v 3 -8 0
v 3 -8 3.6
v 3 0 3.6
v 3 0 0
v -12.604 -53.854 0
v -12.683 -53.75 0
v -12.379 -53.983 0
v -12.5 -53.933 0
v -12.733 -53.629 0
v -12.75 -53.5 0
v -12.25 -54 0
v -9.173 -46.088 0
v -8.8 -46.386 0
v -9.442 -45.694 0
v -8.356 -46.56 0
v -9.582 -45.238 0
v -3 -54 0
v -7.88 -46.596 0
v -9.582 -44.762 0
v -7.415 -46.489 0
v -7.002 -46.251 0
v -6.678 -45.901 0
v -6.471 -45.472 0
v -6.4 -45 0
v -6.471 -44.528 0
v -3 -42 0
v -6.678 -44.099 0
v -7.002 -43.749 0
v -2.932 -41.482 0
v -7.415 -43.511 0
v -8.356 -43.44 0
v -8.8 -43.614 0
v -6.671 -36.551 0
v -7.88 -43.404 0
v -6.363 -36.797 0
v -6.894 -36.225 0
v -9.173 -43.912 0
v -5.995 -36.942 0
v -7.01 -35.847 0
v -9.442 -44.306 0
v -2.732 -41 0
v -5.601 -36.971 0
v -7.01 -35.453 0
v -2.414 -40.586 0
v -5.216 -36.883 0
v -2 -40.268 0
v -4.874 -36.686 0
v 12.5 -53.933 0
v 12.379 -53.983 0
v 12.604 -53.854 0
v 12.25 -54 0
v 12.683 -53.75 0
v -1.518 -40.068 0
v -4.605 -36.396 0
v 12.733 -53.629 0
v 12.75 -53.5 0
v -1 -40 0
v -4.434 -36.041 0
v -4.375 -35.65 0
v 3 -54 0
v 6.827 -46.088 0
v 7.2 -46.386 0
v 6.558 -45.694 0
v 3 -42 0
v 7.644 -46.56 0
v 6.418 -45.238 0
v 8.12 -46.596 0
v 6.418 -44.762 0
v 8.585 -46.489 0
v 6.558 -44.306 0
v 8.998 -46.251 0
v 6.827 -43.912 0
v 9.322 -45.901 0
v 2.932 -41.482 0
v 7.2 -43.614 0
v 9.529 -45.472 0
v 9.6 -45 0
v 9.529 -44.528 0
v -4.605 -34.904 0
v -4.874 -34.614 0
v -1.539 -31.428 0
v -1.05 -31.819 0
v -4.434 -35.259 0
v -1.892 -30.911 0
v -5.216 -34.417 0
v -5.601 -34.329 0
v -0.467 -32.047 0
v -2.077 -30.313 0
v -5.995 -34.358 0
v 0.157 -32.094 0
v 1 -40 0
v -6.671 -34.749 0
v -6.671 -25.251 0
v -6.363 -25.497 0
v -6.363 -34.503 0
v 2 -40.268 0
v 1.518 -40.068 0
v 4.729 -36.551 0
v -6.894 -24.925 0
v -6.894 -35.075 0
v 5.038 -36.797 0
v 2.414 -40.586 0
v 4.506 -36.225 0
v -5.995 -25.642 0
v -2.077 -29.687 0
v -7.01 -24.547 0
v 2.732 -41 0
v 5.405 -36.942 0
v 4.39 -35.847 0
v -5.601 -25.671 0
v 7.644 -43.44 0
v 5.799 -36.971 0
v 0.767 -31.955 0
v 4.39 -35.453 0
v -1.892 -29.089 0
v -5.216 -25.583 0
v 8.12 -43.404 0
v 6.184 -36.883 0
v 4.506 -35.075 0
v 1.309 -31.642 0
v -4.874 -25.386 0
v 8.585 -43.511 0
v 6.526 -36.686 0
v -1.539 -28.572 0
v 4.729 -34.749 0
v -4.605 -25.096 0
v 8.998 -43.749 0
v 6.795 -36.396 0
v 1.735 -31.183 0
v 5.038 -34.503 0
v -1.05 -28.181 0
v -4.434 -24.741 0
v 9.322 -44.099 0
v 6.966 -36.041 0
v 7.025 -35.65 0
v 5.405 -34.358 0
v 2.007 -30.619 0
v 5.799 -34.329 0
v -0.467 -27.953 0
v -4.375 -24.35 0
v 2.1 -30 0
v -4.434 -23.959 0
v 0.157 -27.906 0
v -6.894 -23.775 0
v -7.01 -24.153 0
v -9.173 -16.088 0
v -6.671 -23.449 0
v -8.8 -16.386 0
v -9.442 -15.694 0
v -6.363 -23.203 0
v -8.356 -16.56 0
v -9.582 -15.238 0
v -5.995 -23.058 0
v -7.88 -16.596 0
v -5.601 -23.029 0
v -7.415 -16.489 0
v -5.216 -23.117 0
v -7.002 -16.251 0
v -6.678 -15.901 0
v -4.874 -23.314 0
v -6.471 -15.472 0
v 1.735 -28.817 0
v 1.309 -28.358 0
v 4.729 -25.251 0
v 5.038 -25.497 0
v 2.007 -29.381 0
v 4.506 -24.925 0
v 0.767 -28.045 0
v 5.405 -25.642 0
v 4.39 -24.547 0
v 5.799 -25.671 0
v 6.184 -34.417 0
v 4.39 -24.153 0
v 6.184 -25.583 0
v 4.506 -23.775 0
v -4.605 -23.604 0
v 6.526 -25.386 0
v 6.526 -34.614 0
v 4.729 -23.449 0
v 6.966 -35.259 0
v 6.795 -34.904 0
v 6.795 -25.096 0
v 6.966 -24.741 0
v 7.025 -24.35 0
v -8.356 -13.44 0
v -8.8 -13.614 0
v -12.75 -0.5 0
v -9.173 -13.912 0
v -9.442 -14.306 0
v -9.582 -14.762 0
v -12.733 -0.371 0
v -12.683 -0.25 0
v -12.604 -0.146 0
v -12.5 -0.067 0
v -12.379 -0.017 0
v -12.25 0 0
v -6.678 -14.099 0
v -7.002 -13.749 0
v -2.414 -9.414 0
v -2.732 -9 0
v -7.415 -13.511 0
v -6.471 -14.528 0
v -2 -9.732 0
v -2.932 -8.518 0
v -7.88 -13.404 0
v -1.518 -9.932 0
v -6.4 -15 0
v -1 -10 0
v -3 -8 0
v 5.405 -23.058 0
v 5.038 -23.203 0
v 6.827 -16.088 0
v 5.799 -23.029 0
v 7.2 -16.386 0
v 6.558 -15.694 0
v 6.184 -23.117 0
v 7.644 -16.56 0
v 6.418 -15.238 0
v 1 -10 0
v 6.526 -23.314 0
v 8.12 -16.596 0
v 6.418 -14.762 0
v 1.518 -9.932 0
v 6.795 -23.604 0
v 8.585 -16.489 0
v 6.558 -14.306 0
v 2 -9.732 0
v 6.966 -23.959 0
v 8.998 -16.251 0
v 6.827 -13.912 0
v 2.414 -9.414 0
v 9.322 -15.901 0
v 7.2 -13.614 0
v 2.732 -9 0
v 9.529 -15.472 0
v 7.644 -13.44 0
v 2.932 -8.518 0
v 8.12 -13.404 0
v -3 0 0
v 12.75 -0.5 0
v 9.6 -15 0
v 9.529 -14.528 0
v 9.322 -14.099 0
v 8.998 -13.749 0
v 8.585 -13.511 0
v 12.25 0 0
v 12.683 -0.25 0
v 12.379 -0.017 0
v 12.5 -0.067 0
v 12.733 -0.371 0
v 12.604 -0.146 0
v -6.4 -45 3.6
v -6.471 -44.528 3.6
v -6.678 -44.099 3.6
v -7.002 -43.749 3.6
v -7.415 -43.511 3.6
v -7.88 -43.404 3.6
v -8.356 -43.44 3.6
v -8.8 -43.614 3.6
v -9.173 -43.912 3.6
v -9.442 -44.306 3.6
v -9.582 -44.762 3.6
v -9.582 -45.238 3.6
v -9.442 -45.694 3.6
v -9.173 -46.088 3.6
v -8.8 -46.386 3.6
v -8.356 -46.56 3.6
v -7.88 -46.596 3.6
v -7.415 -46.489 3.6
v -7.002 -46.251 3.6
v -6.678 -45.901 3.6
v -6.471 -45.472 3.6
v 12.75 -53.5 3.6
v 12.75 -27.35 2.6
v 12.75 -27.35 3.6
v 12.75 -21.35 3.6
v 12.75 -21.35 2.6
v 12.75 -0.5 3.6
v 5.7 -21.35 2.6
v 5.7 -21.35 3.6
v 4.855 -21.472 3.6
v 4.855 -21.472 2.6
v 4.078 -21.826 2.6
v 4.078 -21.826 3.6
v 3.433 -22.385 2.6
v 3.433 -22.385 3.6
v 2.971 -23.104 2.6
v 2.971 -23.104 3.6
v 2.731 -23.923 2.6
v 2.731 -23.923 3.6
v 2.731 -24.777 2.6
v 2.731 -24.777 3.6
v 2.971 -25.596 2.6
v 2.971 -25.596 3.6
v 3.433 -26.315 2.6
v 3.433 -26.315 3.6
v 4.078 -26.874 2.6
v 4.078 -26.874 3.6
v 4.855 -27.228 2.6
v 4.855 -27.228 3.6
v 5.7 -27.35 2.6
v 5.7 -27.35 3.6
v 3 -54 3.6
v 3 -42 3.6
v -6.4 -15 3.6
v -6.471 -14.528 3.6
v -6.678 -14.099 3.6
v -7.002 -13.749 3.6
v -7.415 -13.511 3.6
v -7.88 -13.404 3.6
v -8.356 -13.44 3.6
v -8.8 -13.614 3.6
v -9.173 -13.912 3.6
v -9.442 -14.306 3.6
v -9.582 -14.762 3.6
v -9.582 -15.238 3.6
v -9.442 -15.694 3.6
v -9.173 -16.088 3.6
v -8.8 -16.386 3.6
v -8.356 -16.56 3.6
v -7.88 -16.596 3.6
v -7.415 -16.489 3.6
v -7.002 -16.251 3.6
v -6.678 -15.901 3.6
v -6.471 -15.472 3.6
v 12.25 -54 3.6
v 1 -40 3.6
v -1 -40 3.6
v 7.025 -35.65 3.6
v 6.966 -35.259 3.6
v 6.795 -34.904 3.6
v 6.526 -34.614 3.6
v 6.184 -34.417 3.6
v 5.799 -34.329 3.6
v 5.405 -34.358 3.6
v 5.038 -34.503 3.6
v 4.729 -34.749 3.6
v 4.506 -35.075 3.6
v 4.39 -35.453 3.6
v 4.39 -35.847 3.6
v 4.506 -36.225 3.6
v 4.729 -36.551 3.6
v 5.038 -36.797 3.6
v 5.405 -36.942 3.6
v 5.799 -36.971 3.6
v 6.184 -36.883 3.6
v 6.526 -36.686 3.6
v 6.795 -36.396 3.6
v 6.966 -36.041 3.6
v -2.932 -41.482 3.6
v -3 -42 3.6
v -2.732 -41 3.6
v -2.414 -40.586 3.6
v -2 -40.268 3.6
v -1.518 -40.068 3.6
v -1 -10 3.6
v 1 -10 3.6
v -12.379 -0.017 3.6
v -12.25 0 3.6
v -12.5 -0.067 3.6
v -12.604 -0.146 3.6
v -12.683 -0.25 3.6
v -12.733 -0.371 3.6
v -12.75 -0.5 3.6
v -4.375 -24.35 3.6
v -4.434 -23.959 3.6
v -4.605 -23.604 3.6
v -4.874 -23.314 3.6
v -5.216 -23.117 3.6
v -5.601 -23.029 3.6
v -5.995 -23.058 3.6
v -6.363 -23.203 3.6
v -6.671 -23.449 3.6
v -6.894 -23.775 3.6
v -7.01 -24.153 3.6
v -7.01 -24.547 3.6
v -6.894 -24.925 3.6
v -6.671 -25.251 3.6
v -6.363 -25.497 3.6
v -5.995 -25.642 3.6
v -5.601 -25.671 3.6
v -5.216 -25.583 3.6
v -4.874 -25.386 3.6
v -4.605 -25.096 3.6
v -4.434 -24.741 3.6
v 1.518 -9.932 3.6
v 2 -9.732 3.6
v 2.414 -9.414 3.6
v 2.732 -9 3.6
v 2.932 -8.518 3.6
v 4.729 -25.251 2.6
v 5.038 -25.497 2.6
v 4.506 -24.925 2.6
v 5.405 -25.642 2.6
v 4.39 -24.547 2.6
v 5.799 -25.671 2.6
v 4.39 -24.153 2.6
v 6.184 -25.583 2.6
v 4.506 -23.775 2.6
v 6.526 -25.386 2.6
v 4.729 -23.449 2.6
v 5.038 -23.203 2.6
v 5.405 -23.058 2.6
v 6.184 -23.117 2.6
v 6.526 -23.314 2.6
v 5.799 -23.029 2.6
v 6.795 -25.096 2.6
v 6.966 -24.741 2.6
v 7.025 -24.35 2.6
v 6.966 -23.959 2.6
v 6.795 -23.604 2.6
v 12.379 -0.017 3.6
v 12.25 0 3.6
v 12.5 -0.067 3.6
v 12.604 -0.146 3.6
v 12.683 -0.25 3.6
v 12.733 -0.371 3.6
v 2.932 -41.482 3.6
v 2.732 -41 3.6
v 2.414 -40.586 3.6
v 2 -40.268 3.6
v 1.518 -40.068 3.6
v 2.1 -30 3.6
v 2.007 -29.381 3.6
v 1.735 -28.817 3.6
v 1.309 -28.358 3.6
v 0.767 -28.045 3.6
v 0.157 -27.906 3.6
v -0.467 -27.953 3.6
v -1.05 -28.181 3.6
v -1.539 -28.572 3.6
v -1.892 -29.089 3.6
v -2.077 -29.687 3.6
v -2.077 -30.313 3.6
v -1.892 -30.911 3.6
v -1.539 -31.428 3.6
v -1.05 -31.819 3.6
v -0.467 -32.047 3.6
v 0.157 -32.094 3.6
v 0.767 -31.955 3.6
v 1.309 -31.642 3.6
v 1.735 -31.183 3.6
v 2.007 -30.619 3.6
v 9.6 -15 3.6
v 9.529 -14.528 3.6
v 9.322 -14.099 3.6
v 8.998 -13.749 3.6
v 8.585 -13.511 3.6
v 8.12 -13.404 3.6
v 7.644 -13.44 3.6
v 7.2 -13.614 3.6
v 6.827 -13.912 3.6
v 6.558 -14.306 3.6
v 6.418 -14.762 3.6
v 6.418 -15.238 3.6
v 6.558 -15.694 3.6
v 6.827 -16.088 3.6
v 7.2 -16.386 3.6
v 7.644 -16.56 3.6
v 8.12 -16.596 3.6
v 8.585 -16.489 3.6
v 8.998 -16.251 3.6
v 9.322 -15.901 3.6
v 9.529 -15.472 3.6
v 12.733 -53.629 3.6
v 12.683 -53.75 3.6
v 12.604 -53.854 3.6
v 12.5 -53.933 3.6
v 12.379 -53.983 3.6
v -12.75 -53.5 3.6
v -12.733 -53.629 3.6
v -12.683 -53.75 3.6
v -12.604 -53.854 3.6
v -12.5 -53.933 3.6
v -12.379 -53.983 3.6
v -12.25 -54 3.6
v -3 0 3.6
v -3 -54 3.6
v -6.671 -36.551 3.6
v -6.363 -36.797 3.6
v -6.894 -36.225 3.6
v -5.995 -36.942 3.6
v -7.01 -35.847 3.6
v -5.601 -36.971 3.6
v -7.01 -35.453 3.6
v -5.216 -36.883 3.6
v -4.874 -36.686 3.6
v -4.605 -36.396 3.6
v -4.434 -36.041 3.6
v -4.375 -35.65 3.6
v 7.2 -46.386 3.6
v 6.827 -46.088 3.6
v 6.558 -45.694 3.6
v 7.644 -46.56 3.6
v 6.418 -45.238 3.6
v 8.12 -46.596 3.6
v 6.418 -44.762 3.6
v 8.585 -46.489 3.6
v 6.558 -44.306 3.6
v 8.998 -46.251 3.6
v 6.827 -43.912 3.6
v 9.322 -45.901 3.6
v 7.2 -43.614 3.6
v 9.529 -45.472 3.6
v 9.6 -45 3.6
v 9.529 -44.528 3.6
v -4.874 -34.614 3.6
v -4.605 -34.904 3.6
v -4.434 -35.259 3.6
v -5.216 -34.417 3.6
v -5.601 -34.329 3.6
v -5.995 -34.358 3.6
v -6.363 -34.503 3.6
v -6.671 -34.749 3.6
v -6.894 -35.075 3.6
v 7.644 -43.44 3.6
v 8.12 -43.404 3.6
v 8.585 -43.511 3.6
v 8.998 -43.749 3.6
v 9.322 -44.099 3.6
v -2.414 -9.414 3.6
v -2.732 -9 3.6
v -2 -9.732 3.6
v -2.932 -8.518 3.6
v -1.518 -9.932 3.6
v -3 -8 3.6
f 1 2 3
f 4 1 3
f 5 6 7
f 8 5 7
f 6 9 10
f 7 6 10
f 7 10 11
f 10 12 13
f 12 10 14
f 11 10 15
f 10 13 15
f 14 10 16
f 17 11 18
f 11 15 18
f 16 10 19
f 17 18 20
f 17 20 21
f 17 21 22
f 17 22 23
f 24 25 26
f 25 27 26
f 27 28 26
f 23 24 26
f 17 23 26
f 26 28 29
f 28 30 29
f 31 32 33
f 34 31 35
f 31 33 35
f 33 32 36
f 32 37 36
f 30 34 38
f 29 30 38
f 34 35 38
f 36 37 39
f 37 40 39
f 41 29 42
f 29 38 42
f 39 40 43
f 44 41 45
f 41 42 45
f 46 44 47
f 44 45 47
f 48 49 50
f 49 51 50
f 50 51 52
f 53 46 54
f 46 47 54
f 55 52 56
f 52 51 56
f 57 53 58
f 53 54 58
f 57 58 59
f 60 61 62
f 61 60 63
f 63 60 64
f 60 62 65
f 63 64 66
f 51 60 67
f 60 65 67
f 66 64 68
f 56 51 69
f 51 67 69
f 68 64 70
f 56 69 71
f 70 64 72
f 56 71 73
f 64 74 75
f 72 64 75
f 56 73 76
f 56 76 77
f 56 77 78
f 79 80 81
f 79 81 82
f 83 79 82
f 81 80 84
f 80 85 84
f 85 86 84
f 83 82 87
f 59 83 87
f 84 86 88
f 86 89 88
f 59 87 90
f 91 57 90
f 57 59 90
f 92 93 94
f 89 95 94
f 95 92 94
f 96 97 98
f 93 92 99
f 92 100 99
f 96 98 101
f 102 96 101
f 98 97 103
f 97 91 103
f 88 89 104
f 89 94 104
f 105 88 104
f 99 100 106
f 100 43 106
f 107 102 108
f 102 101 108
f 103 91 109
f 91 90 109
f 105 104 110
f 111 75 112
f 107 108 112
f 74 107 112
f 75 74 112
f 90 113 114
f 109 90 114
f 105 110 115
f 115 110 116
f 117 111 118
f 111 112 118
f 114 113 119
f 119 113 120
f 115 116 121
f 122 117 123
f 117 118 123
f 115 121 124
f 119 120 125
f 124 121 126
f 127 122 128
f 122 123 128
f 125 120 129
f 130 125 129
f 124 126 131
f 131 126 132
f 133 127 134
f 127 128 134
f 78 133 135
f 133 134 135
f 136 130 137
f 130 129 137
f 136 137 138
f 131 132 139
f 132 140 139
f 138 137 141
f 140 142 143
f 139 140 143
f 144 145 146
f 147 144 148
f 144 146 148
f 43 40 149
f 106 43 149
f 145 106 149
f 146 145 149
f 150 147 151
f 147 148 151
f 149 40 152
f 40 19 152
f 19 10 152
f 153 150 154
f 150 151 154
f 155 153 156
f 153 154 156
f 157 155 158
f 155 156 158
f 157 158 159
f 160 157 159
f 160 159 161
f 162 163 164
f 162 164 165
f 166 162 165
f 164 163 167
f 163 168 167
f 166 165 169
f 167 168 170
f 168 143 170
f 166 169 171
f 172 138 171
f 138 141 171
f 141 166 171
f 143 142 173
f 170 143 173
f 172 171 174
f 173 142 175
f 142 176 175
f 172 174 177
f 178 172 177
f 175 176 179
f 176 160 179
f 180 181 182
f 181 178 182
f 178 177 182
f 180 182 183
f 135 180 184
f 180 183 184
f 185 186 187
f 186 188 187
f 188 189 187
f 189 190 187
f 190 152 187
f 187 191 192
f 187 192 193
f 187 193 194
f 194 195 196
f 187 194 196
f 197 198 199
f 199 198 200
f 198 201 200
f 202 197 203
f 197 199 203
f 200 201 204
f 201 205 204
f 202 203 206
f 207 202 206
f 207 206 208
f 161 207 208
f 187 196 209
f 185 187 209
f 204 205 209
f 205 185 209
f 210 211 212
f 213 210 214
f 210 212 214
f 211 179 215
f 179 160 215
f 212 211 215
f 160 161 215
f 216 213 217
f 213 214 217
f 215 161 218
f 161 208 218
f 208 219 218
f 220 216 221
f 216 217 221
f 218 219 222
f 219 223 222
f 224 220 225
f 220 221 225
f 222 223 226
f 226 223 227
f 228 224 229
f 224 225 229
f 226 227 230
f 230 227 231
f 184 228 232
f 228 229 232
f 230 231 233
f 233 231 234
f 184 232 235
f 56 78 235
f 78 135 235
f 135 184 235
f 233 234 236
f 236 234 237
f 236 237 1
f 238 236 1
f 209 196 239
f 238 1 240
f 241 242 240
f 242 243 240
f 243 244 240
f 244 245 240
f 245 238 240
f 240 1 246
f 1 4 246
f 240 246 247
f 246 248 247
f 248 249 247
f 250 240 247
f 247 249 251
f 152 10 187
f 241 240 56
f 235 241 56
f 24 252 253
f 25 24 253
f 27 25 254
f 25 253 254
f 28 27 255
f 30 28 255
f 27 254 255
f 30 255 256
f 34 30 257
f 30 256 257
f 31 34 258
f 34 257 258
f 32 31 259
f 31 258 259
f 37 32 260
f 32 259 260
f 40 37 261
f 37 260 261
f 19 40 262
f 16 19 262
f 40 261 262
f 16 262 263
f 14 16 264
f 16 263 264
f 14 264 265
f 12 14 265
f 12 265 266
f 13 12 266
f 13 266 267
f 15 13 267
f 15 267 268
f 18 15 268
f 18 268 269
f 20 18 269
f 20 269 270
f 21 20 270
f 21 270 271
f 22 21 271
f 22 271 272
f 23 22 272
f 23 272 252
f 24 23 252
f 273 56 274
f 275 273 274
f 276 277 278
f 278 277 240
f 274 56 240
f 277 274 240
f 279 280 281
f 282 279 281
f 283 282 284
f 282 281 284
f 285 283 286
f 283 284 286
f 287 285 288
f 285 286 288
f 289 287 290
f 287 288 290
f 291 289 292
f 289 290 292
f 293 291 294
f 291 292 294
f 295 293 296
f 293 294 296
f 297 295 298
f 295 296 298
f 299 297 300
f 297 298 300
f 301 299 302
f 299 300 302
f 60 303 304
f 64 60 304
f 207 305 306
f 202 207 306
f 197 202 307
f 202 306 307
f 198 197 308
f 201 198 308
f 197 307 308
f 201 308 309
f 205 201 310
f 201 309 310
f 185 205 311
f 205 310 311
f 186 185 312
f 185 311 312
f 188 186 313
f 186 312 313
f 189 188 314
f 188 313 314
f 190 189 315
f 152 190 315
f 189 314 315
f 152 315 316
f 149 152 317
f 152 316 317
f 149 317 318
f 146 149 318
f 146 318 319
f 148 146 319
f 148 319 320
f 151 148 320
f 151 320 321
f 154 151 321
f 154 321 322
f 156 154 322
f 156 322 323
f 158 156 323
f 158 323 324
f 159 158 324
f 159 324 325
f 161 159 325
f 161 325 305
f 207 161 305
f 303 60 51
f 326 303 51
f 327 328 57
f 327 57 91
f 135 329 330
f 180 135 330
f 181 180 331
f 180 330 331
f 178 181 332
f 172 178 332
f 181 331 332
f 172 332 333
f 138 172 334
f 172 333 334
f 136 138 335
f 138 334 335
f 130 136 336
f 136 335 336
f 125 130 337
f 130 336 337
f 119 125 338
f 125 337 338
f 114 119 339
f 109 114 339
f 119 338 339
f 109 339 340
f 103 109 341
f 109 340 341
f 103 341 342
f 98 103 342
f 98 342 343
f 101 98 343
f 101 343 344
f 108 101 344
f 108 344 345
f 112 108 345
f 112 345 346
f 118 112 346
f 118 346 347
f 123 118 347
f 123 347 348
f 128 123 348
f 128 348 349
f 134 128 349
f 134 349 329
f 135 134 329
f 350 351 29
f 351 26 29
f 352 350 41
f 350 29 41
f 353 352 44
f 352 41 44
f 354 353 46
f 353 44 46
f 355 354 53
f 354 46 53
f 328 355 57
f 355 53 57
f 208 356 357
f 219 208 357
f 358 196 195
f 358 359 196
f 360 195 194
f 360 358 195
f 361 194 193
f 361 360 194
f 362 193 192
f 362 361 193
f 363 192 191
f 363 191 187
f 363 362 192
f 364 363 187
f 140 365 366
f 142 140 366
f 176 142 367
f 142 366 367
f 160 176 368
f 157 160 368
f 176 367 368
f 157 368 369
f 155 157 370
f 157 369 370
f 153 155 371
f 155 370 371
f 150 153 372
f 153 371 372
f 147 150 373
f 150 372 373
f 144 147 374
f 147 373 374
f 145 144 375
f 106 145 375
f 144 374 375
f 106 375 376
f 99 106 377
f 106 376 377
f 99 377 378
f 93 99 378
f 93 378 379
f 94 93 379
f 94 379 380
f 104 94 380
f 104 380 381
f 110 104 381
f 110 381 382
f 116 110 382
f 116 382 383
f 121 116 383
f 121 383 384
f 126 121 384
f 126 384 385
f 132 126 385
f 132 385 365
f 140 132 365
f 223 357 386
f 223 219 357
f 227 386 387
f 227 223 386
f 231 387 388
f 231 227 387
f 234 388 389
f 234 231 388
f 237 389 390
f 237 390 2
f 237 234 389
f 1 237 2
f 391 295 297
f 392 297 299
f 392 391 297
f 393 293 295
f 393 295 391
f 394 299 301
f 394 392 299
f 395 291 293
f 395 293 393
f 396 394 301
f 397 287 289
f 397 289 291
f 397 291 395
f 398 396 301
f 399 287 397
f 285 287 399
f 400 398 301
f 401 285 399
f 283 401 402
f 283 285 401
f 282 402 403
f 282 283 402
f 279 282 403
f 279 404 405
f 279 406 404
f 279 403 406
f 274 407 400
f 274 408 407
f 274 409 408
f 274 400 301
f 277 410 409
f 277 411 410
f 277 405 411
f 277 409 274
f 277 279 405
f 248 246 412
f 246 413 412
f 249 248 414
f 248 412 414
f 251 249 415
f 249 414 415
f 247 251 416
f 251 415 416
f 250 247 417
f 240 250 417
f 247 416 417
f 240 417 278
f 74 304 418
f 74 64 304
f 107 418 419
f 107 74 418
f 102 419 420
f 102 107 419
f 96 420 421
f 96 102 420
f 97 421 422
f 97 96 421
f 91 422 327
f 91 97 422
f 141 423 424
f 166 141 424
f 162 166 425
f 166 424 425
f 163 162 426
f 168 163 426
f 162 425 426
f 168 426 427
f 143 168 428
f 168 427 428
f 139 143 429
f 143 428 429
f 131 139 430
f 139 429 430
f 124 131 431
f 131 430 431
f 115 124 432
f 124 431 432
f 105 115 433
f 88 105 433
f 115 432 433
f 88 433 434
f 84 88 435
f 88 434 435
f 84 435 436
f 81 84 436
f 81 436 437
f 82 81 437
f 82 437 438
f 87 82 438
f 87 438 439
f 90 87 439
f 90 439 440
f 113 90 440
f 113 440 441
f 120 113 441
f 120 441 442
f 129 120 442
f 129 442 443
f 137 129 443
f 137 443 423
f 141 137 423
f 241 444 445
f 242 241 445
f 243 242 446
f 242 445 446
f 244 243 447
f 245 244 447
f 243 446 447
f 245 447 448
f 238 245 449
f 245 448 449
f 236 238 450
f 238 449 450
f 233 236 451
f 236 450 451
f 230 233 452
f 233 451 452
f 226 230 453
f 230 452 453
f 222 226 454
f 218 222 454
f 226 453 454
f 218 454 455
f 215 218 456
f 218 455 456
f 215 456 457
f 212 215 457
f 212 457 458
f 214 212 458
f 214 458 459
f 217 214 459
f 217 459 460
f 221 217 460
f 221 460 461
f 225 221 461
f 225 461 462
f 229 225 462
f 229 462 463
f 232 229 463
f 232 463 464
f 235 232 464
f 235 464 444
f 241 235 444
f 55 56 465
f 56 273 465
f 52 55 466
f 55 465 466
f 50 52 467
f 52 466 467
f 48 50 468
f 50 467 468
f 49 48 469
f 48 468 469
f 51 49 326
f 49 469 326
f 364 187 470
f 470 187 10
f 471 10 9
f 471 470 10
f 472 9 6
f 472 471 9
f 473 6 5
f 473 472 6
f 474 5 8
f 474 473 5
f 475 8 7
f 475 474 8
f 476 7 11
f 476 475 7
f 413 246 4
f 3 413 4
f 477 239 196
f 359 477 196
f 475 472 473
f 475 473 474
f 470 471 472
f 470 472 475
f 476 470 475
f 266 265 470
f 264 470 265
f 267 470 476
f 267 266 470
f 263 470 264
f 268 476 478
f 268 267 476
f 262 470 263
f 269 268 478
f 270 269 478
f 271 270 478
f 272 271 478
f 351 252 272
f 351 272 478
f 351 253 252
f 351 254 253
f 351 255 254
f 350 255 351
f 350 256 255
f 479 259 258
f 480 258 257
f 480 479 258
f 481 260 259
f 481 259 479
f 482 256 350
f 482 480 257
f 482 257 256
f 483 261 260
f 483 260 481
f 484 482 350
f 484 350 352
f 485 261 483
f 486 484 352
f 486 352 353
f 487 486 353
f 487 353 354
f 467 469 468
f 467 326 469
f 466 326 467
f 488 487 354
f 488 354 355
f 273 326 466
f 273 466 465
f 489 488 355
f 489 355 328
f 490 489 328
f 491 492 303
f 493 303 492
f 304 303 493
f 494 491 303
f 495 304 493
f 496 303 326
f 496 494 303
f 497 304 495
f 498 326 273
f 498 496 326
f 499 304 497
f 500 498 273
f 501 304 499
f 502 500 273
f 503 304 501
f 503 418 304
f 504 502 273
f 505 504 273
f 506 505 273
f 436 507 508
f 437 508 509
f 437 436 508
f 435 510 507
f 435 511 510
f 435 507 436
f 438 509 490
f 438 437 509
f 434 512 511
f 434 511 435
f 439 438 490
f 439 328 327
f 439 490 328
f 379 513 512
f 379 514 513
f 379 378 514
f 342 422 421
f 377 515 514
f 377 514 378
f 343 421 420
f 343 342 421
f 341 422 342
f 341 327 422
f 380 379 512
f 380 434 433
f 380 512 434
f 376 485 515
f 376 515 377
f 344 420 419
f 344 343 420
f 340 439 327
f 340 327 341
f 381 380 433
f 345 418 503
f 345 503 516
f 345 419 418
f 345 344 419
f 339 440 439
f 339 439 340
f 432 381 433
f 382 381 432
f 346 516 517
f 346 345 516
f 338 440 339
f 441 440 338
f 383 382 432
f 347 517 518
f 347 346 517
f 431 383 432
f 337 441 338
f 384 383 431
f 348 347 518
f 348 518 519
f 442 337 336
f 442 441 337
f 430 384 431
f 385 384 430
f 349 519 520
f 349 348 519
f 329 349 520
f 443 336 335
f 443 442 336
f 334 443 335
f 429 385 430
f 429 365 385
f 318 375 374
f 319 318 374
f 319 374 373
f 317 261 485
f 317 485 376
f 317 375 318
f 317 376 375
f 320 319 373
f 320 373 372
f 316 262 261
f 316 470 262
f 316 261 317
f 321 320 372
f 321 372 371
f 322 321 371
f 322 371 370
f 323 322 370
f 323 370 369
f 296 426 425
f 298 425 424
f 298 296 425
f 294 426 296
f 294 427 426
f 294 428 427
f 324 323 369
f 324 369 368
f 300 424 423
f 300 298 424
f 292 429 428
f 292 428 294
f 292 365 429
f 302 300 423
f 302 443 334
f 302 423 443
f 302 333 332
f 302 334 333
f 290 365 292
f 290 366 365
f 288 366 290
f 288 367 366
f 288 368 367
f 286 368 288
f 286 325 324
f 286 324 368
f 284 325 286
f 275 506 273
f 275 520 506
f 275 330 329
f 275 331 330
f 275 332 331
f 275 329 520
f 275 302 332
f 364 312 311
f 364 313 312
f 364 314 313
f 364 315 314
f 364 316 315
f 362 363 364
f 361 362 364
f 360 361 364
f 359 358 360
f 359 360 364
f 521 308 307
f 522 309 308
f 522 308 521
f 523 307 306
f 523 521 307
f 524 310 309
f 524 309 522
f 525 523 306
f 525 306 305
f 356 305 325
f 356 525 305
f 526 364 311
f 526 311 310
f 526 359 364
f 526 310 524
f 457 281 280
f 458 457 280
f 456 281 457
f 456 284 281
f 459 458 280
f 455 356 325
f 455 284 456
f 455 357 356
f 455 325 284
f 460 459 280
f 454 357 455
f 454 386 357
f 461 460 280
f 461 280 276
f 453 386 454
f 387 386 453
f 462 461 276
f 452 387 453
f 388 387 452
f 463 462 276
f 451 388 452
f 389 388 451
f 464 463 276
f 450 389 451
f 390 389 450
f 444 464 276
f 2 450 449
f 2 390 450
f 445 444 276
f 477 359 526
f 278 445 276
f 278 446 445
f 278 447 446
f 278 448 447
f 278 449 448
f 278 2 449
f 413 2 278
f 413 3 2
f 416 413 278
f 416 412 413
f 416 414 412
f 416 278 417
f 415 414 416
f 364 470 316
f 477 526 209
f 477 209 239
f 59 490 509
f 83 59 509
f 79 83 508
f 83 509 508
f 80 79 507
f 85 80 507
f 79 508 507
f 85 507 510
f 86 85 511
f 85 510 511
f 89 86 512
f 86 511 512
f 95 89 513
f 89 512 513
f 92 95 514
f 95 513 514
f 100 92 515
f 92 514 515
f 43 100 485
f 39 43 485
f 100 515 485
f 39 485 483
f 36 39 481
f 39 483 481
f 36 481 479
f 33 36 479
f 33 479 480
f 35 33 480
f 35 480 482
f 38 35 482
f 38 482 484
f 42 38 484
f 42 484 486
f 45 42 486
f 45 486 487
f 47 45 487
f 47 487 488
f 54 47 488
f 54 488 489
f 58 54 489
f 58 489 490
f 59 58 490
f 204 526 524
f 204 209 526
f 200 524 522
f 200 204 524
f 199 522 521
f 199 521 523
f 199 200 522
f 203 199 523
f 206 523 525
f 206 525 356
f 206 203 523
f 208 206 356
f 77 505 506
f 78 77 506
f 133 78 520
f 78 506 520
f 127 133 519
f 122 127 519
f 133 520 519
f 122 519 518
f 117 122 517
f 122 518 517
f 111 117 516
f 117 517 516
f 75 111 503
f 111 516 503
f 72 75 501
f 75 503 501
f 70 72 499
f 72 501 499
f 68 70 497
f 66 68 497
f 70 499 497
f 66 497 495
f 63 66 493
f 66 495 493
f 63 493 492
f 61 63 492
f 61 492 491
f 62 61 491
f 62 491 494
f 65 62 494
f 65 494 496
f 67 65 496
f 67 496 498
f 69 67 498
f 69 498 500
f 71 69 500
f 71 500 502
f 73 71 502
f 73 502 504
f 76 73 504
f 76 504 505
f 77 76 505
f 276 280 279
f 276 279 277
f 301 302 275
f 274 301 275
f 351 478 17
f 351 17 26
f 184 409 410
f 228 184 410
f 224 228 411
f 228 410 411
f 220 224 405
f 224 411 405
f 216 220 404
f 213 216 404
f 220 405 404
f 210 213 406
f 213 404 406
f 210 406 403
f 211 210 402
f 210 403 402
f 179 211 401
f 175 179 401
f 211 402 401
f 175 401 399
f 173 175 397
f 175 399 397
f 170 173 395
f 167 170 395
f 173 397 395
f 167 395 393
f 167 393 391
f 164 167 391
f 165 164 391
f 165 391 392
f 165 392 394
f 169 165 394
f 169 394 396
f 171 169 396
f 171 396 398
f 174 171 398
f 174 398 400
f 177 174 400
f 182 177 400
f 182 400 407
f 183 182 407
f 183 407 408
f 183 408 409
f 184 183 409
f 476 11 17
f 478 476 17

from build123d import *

# Parameters (mm, degrees)
PAD008_DEPTH    = 3.6
SKETCH034_W     = 6
SKETCH034_H     = 14
SKETCH034_H_2   = 10
POCKET014_DEPTH = 5
FILLET007_R     = 2
SKETCH035_R     = 2.1
POCKET019_DEPTH = 5
SKETCH032_R     = 1.325
POCKET020_DEPTH = 5
SKETCH033_R     = 1.6
HOLE004_DEPTH   = 25
FILLET010_R     = 0.5
POCKET043_DEPTH = 1


with BuildPart() as part:
    # Sketch031 → Pad008 (new body)
    with BuildSketch(Plane.XY):
        Polygon((-12.75, 0), (-12.75, -5), (-12.75, -54), (12.75, -54), (12.75, -5), (12.75, 0), align=None)
    extrude(amount=PAD008_DEPTH)

    # Sketch034 (on Face4 of Pad008) → Pocket014 (cut)
    with BuildSketch(Plane.XY.offset(3.6)):
        with Locations((0, -47)):
            Rectangle(SKETCH034_W, SKETCH034_H)
        with Locations((0, -5)):
            Rectangle(SKETCH034_W, SKETCH034_H_2)
    extrude(amount=-POCKET014_DEPTH, mode=Mode.SUBTRACT)

    # Fillet007
    fillet007_edges = [part.edges().sort_by_distance(p)[0] for p in [
        (-3, -10, 1.8),
        (3, -10, 1.8),
        (3, -40, 1.8),
        (-3, -40, 1.8),
    ]]
    fillet(fillet007_edges, radius=FILLET007_R)

    # Sketch035 (on Face4 of Pad008) → Pocket019 (cut)
    with BuildSketch(Plane.XY.offset(3.6)):
        with Locations((0, -30)):
            Circle(SKETCH035_R)
    extrude(amount=-POCKET019_DEPTH, mode=Mode.SUBTRACT)

    # Sketch032 (on Face4 of Pad008) → Pocket020 (cut)
    with BuildSketch(Plane.XY.offset(3.6)):
        with Locations((-5.7, -24.35)):
            Circle(SKETCH032_R)
        with Locations((5.7, -24.35)):
            Circle(SKETCH032_R)
        with Locations((5.7, -35.65)):
            Circle(SKETCH032_R)
        with Locations((-5.7, -35.65)):
            Circle(SKETCH032_R)
    extrude(amount=-POCKET020_DEPTH, mode=Mode.SUBTRACT)

    # Sketch033 (on Face4 of Pad008) → Hole004 (cut)
    with BuildSketch(Plane.XY.offset(3.6)):
        with Locations((-8, -15)):
            Circle(SKETCH033_R)
        with Locations((8, -15)):
            Circle(SKETCH033_R)
        with Locations((-8, -45)):
            Circle(SKETCH033_R)
        with Locations((8, -45)):
            Circle(SKETCH033_R)
    extrude(amount=-HOLE004_DEPTH, mode=Mode.SUBTRACT)

    # Fillet010
    fillet010_edges = [part.edges().sort_by_distance(p)[0] for p in [
        (-12.75, 0, 1.8),
        (-12.75, -54, 1.8),
        (12.75, 0, 1.8),
        (12.75, -54, 1.8),
    ]]
    fillet(fillet010_edges, radius=FILLET010_R)

    # Sketch098 (on Face31 of Fillet010) → Pocket043 (cut)
    with BuildSketch(Plane.XY.offset(3.6)):
        with BuildLine():
            ThreePointArc((5.7, -21.35), (2.7, -24.35), (5.7, -27.35))
            Line((5.7, -27.35), (12.75, -27.35))
            Line((12.75, -21.35), (12.75, -27.35))
            Line((5.7, -21.35), (12.75, -21.35))
        make_face()
    extrude(amount=-POCKET043_DEPTH, mode=Mode.SUBTRACT)


solid = part.part
